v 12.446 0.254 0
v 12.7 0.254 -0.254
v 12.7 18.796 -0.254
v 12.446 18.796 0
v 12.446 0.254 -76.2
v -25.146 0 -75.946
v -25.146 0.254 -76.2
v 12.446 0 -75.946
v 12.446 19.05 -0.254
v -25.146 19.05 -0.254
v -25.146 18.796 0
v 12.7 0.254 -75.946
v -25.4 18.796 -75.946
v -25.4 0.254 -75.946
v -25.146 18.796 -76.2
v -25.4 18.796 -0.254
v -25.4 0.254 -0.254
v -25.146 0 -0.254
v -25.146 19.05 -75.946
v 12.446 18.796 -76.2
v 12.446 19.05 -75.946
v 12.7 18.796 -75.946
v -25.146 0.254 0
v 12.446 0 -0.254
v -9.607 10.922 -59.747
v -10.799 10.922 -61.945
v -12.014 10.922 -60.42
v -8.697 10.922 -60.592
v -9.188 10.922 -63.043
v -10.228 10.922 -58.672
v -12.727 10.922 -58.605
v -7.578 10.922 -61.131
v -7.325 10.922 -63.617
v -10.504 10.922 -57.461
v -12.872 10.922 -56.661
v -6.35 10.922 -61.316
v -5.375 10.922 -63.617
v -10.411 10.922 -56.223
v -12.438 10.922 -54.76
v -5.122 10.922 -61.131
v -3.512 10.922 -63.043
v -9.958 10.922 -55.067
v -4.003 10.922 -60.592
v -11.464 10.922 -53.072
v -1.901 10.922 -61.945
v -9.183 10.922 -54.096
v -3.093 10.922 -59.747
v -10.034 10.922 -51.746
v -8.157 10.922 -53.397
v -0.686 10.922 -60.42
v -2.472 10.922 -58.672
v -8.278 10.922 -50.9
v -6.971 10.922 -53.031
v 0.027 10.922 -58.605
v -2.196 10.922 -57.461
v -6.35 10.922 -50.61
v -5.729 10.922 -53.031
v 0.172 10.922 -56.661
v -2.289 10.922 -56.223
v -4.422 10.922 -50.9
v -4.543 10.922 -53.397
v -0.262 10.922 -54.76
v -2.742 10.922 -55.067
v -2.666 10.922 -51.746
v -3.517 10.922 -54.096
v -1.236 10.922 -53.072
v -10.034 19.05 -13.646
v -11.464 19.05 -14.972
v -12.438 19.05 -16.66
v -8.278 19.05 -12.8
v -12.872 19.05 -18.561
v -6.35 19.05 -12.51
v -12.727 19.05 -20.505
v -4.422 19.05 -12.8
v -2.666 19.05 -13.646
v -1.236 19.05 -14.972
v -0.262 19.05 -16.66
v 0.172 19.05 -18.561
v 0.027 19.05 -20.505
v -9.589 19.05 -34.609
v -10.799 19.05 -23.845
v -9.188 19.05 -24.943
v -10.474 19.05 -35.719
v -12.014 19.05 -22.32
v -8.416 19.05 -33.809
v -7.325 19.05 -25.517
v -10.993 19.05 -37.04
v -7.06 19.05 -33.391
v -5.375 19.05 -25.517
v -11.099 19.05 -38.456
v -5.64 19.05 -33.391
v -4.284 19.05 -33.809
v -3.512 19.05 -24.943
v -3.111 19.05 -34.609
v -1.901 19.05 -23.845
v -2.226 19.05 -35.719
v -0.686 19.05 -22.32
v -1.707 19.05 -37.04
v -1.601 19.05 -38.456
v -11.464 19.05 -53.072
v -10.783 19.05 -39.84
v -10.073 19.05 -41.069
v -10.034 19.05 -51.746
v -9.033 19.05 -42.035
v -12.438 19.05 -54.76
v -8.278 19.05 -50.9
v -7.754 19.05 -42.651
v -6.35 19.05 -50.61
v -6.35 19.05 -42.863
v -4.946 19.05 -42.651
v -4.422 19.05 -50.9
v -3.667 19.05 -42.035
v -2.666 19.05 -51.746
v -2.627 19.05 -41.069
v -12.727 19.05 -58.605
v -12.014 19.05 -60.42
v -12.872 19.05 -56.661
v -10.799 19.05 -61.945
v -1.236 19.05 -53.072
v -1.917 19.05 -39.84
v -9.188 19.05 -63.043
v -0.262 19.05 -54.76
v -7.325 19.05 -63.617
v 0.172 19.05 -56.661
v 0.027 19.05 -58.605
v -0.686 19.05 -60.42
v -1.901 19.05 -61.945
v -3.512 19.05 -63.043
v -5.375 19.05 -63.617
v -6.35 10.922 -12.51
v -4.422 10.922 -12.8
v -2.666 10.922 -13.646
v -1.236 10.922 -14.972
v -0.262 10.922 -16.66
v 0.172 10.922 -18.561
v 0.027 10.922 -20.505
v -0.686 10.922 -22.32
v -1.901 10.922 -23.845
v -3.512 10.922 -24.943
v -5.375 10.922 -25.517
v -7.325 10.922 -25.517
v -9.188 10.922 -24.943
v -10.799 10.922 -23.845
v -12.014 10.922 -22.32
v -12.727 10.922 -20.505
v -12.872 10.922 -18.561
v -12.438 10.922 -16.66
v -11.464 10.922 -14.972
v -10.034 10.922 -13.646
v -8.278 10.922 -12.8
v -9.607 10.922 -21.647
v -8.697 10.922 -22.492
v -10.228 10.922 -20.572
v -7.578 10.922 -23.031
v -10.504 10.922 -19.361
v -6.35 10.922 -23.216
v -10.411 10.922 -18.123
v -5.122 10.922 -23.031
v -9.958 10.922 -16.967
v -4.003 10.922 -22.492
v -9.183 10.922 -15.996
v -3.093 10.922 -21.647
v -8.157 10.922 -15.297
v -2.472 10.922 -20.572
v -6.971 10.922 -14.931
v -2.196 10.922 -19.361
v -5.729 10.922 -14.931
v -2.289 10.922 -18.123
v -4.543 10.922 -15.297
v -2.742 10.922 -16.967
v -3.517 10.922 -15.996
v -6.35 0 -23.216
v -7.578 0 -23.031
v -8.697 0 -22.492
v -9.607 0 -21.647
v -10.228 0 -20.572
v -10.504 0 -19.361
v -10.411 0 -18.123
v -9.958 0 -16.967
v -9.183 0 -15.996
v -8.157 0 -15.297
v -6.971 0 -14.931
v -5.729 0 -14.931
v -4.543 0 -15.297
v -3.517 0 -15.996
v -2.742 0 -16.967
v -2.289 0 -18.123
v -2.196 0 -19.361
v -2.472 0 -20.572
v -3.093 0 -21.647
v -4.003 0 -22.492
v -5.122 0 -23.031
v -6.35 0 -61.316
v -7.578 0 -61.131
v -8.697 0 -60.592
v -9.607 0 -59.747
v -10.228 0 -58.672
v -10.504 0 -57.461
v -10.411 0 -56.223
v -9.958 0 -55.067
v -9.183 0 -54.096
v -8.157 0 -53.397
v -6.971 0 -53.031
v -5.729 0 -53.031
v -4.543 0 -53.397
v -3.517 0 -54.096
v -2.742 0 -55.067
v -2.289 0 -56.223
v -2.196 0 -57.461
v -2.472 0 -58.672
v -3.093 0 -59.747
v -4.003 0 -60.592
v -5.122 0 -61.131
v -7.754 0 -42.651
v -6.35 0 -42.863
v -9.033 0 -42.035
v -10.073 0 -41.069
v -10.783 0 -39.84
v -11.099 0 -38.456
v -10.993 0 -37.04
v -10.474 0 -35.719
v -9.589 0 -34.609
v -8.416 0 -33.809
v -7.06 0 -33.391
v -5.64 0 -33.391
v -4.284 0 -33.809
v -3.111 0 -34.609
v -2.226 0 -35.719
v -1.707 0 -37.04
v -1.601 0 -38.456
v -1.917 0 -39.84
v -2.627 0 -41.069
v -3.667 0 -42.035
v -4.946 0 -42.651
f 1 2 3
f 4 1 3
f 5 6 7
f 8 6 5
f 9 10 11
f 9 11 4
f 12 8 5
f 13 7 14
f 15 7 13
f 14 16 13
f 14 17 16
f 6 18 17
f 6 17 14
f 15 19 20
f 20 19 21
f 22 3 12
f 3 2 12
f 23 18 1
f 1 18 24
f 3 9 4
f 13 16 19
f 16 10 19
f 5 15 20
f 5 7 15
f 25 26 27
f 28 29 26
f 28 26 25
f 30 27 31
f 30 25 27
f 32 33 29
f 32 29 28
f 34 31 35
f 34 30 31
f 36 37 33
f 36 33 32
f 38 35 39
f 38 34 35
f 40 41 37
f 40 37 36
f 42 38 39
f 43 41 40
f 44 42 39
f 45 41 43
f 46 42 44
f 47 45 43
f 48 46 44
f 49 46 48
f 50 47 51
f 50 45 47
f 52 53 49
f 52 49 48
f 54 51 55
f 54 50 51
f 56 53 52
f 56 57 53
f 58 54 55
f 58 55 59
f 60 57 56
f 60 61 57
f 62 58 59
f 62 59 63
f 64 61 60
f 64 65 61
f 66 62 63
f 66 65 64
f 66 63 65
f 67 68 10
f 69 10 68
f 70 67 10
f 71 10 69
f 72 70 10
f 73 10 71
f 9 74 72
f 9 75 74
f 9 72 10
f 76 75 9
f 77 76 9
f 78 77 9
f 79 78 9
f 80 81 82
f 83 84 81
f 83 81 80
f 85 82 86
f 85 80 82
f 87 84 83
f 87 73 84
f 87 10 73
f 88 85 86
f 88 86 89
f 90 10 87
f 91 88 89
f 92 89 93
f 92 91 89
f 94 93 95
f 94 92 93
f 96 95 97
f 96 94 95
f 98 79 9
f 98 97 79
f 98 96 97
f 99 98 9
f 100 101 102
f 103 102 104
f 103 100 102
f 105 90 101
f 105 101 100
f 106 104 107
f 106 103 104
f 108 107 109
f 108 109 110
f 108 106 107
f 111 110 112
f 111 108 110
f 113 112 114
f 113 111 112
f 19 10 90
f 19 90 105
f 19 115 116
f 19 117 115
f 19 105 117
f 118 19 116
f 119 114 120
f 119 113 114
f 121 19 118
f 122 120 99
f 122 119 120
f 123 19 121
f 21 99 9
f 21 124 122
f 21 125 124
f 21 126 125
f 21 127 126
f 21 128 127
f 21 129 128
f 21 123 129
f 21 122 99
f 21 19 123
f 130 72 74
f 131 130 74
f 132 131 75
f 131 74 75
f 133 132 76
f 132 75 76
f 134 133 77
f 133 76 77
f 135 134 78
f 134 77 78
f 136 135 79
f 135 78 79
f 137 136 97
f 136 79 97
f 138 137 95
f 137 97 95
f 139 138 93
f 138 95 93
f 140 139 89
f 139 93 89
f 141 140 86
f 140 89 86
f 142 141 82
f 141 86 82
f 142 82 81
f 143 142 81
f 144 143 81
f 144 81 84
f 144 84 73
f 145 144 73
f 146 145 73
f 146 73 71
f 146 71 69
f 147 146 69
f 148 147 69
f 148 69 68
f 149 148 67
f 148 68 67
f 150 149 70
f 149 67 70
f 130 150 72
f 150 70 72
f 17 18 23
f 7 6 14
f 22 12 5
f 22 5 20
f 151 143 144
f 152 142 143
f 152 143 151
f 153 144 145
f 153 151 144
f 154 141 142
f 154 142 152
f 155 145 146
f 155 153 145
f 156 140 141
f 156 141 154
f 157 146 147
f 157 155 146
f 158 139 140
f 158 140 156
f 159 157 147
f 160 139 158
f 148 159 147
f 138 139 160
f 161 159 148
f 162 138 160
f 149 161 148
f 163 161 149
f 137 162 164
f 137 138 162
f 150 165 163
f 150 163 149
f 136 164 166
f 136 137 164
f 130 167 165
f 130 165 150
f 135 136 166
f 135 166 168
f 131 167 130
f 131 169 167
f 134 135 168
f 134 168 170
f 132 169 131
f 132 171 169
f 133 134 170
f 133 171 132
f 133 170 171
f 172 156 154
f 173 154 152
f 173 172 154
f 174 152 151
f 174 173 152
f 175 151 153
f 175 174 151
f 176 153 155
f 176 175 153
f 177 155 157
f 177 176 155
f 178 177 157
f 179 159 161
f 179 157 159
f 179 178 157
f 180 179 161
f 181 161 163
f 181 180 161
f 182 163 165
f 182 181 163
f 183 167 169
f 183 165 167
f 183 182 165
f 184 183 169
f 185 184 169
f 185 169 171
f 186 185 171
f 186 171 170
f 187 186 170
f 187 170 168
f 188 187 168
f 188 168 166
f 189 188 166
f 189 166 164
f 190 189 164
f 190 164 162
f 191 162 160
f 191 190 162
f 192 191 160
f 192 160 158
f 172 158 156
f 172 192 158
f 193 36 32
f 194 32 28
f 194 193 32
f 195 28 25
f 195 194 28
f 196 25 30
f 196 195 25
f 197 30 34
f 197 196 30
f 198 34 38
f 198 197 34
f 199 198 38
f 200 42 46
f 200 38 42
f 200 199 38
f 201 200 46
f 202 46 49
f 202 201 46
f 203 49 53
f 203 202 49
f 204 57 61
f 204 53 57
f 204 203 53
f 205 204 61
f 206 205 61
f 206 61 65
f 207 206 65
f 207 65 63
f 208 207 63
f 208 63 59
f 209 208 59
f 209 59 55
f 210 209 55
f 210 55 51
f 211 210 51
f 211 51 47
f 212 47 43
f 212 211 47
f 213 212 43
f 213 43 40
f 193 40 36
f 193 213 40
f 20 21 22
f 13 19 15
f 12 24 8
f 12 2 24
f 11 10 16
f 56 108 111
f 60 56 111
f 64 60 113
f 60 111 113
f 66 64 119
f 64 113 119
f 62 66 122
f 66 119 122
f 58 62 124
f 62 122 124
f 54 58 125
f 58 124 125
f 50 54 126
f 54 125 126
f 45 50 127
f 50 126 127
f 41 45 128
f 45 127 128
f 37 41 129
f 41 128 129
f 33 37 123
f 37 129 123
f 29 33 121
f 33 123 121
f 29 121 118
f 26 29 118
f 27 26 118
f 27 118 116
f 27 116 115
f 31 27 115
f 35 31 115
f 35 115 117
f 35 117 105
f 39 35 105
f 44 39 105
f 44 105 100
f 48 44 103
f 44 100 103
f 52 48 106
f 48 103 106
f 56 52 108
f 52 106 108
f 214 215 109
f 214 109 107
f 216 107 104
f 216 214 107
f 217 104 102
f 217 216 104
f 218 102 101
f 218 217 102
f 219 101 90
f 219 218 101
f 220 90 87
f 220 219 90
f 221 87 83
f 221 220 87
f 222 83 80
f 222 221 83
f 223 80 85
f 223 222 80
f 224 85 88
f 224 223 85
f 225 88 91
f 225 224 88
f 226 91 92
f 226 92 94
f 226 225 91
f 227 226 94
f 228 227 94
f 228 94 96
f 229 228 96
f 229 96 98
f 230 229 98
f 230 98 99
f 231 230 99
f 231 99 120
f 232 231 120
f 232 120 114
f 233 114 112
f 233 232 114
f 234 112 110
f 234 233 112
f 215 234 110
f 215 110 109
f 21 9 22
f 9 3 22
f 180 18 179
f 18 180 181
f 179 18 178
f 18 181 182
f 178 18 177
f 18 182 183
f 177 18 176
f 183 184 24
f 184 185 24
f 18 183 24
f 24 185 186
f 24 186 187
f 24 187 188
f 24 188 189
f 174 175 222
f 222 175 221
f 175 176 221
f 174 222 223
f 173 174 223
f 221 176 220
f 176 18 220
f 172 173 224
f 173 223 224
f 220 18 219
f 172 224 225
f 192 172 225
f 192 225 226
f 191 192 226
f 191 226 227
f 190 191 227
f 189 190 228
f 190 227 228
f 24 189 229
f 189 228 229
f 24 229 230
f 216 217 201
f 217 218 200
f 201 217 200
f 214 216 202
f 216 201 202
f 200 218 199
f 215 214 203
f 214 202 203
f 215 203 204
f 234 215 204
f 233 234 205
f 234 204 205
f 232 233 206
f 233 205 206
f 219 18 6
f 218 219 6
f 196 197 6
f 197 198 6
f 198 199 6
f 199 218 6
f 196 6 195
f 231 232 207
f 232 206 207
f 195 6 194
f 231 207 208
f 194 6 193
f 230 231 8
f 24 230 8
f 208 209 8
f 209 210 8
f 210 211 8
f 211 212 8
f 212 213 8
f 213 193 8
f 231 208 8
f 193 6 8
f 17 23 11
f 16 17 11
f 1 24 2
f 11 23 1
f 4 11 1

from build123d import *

# Parameters (mm, degrees)
SKETCH1_W          = 38.1
SKETCH1_H          = 76.2
SKETCH1_R          = 4.1656
SKETCH1_R_2        = 4.7625
EXTRUDE1_DEPTH     = 19.05
SKETCH2_R          = 6.5405
CUT_EXTRUDE1_DEPTH = 8.128
CHAMFER1_SIZE      = 0.254


with BuildPart() as part:
    # Sketch1 → Extrude1 (new body)
    with BuildSketch(Plane(origin=(0, 0, 0), x_dir=(1, 0, 0), z_dir=(0, 1, 0))):
        with Locations((-6.35, 38.1)):
            Rectangle(SKETCH1_W, SKETCH1_H)
        with Locations(Location((-6.35, 57.15, 0), (0, 0, 90))):
            Circle(SKETCH1_R, mode=Mode.SUBTRACT)
        with Locations(Location((-6.35, 19.05, 0), (0, 0, 90))):
            Circle(SKETCH1_R, mode=Mode.SUBTRACT)
        with Locations(Location((-6.35, 38.1, 0), (0, 0, 90))):
            Circle(SKETCH1_R_2, mode=Mode.SUBTRACT)
    extrude(amount=EXTRUDE1_DEPTH)

    # Sketch2 → Cut-Extrude1 (cut)
    with BuildSketch(Plane(origin=(0, 19.05, 0), x_dir=(1, 0, 0), z_dir=(0, 1, 0))):
        with Locations(Location((-6.35, 57.15, 0), (0, 0, 270))):
            Circle(SKETCH2_R)
        with Locations(Location((-6.35, 19.05, 0), (0, 0, 270))):
            Circle(SKETCH2_R)
    extrude(amount=-CUT_EXTRUDE1_DEPTH, mode=Mode.SUBTRACT)

    # Chamfer1
    chamfer1_edges = [part.edges().sort_by_distance(p)[0] for p in [
        (12.7, 19.05, -38.1),
        (-6.35, 19.05, -76.2),
        (-25.4, 19.05, -38.1),
        (-6.35, 0, -76.2),
        (12.7, 0, -38.1),
        (-6.35, 0, 0),
        (-25.4, 0, -38.1),
        (-6.35, 19.05, 0),
        (-25.4, 9.525, -76.2),
        (12.7, 9.525, -76.2),
        (12.7, 9.525, 0),
        (-25.4, 9.525, 0),
    ]]
    chamfer(chamfer1_edges, length=CHAMFER1_SIZE)


solid = part.part
